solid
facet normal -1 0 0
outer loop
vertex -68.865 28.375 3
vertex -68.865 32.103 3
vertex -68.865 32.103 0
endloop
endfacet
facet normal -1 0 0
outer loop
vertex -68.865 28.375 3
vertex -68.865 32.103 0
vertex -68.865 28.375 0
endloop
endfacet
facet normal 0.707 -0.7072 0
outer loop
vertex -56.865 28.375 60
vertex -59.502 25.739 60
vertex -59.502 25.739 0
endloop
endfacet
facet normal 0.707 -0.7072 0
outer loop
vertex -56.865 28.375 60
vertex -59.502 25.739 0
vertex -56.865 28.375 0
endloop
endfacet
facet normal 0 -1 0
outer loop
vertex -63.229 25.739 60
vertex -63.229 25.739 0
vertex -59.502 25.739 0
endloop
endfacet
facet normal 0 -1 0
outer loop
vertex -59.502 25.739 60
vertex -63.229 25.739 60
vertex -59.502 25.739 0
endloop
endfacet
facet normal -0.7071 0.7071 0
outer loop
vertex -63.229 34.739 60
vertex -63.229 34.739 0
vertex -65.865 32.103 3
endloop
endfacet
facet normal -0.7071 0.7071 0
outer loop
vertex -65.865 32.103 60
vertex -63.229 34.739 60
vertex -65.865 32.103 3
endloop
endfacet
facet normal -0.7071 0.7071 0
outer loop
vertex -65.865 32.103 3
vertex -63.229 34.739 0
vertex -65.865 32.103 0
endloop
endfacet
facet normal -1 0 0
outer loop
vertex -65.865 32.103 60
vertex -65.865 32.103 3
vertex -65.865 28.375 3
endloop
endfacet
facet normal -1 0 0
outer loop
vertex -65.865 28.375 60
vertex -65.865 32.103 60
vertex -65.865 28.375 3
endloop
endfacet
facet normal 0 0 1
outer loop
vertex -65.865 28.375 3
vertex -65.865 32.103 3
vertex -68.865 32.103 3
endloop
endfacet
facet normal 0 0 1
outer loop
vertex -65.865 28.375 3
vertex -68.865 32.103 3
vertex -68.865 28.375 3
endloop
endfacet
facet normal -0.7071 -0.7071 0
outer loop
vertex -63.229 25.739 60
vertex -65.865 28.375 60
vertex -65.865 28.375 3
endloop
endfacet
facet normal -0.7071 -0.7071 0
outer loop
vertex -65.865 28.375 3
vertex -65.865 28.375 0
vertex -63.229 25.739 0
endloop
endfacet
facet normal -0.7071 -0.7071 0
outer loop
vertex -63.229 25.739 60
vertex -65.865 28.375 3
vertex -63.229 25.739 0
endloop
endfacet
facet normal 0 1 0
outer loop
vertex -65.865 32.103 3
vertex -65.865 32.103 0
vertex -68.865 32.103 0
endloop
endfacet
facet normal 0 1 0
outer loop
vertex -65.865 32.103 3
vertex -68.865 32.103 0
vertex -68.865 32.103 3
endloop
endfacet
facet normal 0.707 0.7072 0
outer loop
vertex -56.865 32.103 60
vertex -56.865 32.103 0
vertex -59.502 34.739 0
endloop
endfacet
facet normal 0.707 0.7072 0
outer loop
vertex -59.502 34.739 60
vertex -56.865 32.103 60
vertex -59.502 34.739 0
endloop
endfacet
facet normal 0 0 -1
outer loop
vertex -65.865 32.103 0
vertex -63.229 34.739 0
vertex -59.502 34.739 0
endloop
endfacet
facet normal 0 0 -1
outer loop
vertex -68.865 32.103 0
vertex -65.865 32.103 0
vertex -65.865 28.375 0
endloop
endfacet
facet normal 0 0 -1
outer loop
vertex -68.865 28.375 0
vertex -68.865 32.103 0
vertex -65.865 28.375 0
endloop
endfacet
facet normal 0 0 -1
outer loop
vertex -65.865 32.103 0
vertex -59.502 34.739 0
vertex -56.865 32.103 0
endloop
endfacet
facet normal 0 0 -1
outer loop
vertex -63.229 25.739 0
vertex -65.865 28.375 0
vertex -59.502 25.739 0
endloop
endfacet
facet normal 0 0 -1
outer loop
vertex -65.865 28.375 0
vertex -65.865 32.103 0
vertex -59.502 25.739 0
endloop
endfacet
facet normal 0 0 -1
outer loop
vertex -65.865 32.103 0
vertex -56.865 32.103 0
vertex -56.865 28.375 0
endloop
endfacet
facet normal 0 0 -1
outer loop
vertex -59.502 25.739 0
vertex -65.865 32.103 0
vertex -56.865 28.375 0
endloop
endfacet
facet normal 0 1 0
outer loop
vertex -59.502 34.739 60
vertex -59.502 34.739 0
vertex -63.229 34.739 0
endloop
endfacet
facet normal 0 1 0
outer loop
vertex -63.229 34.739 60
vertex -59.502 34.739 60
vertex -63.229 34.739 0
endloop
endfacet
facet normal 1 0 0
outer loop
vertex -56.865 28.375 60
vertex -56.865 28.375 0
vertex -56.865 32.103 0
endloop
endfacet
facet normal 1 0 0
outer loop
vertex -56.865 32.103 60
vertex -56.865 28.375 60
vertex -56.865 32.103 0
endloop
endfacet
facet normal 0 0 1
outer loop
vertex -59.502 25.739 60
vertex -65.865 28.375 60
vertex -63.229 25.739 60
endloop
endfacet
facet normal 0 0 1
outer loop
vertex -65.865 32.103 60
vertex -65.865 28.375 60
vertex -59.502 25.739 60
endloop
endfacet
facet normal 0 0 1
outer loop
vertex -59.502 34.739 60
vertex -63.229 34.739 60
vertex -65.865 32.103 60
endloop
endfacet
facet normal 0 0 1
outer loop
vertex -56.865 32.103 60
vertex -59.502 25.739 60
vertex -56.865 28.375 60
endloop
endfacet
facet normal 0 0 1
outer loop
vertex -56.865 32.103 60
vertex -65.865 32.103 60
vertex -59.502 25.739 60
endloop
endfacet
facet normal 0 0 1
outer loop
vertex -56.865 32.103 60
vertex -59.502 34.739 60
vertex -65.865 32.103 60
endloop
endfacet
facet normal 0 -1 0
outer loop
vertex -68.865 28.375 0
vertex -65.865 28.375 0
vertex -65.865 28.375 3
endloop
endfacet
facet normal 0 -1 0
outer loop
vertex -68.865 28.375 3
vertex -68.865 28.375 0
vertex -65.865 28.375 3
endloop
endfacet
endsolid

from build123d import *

# Parameters (mm, degrees)
F1_DEPTH = 60
F2_W     = 3.727922
F2_H     = 3
F3_DEPTH = 3


with BuildPart() as f1:
    # F0 (on Top) → F1 (new body)
    with BuildSketch(Plane.XY):
        Polygon((-59.501522, 25.738621), (-56.865483, 28.37466), (-56.865483, 32.102582), (-59.501522, 34.738621), (-63.229444, 34.738621), (-65.865483, 32.102582), (-65.865483, 28.37466), (-63.229444, 25.738621), align=None)
    extrude(amount=F1_DEPTH)

    # F2 (on face) → F3 (join)
    with BuildSketch(Plane(origin=(-65.865483, 0, 0), x_dir=(0, -1, 0), z_dir=(-1, 0, 0))):
        with Locations((-30.238621, 1.5)):
            Rectangle(F2_W, F2_H)
    extrude(amount=F3_DEPTH)


solid = f1.part
